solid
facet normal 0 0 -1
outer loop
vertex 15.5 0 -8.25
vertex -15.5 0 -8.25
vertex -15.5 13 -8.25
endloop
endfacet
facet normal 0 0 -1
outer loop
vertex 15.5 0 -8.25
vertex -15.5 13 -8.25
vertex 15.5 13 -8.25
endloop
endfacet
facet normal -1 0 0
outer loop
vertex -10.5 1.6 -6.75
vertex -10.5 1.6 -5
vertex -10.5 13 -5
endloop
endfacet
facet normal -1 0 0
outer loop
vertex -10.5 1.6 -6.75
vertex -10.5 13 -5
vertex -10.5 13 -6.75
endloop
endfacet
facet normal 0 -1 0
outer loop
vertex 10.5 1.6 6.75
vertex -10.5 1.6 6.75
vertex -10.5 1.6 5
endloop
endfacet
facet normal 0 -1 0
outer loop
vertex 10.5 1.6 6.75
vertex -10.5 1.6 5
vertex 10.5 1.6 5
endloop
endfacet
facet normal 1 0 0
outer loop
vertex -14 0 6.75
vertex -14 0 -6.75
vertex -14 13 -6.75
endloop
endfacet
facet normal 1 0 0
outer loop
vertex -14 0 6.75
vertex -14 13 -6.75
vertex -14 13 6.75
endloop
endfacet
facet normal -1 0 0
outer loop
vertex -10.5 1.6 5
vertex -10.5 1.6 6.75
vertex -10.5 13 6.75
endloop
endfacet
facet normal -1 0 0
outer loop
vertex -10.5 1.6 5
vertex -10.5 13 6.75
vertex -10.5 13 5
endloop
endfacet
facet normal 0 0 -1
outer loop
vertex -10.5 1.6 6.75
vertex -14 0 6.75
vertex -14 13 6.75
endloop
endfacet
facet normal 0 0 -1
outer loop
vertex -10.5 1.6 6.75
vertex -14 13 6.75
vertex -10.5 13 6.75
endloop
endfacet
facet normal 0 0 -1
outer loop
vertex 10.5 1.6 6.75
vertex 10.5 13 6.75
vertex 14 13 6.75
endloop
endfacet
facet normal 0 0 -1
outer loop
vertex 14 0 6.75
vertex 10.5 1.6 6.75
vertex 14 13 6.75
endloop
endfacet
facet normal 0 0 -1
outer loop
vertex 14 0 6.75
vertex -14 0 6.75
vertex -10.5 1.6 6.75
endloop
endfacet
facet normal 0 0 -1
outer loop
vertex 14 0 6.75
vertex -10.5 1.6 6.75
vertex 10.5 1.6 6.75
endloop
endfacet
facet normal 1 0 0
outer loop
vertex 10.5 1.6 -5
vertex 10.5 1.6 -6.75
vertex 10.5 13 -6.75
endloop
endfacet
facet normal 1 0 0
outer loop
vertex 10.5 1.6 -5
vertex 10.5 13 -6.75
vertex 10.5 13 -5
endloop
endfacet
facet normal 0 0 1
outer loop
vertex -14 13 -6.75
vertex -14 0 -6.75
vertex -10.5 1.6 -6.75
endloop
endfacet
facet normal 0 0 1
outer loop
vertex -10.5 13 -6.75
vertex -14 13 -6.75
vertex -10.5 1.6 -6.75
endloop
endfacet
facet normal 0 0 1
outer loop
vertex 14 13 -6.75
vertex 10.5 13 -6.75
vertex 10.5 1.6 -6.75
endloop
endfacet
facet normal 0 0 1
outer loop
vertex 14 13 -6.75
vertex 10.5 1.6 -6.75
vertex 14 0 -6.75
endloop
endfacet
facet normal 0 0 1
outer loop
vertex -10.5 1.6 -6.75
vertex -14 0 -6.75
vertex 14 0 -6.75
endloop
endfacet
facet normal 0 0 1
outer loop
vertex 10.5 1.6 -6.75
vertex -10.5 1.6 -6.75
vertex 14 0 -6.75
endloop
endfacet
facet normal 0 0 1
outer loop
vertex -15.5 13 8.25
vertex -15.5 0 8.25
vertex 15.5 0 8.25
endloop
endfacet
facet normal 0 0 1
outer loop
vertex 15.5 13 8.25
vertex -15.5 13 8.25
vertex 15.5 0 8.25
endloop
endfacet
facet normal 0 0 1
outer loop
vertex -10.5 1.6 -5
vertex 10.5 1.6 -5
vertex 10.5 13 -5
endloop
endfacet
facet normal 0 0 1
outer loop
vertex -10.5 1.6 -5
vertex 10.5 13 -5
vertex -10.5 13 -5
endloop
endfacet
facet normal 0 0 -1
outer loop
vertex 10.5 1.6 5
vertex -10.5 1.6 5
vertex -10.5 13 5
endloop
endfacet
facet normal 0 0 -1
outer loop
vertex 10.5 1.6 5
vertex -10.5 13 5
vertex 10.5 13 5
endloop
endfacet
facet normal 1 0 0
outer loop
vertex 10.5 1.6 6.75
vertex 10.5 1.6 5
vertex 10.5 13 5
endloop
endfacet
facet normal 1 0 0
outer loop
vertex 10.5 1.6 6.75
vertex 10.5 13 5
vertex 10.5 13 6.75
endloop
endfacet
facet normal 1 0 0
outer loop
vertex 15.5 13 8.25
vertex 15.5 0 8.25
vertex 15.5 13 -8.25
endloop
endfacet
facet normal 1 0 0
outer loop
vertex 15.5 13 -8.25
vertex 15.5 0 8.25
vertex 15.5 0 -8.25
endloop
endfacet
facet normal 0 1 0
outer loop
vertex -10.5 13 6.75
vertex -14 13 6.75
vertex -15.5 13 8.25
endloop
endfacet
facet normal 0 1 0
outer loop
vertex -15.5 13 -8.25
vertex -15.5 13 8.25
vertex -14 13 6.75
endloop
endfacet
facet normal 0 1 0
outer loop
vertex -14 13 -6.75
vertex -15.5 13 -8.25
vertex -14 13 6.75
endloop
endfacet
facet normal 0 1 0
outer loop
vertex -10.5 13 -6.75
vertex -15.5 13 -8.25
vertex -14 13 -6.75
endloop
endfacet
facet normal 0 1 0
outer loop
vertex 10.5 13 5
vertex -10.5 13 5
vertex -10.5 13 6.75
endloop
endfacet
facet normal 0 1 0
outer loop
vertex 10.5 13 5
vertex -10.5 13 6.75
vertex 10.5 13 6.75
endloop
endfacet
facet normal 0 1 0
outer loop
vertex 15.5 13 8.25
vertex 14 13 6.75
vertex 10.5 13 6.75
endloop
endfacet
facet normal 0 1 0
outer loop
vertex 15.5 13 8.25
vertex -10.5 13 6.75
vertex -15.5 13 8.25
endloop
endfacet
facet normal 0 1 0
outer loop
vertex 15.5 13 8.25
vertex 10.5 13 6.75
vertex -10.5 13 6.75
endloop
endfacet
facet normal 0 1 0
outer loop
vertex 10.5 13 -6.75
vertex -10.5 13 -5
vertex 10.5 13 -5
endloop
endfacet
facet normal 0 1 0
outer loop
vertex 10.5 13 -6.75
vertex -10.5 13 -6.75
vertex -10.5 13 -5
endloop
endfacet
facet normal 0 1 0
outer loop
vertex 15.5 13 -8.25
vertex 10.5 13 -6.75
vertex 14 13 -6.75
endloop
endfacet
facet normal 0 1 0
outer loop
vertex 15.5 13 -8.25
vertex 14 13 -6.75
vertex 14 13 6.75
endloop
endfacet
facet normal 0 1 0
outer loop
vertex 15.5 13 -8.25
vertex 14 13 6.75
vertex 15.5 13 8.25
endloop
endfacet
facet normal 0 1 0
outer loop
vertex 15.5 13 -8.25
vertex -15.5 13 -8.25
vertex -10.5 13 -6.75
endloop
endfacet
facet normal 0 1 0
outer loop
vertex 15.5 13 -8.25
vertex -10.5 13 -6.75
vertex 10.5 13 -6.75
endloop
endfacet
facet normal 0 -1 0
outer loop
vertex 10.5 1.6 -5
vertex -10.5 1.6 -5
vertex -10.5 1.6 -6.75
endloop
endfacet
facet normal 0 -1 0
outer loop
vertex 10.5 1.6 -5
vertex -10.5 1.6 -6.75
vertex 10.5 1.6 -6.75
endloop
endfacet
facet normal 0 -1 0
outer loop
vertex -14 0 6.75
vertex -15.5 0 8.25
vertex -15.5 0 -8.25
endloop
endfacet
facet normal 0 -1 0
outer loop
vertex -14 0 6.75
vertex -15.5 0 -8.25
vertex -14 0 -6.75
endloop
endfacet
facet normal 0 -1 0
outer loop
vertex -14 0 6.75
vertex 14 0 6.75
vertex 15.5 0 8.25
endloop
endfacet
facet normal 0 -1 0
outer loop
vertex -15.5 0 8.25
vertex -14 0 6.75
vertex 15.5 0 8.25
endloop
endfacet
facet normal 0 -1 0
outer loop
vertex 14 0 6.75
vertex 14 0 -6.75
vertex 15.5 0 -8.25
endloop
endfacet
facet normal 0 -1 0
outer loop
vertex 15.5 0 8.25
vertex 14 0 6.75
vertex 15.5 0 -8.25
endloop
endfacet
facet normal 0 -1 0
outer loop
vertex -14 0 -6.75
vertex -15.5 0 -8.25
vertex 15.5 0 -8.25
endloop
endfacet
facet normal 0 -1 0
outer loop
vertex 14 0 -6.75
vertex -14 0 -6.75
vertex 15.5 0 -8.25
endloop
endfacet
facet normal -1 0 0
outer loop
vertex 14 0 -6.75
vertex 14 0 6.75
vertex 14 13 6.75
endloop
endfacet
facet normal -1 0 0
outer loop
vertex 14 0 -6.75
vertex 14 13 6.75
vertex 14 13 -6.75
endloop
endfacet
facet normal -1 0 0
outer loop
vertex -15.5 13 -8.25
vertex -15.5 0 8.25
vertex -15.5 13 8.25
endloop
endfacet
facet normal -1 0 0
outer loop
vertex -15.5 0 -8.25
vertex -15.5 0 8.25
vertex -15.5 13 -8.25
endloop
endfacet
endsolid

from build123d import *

# Parameters (mm, degrees)
SKETCH1_W           = 31
SKETCH1_H           = 16.5
BOSS_EXTRUDE1_DEPTH = 13
SKETCH2_W           = 21
SKETCH2_H           = 1.75
CUT_EXTRUDE1_DEPTH  = 1.6


with BuildPart() as part:
    # Sketch1 → Boss-Extrude1 (new body)
    with BuildSketch(Plane(origin=(0, 0, 0), x_dir=(1, 0, 0), z_dir=(0, 1, 0))):
        Rectangle(SKETCH1_W, SKETCH1_H)
        Polygon((10.5, 5), (-10.5, 5), (-10.5, 6.75), (-14, 6.75), (-14, -6.75), (-10.5, -6.75), (-10.5, -5), (10.5, -5), (10.5, -6.75), (14, -6.75), (14, 6.75), (10.5, 6.75), align=None, mode=Mode.SUBTRACT)
    extrude(amount=BOSS_EXTRUDE1_DEPTH)

    # Sketch2 → Cut-Extrude1 (cut)
    with BuildSketch(Plane.XZ):
        with Locations((0, 5.875)):
            Rectangle(SKETCH2_W, SKETCH2_H)
        with Locations((0, -5.875)):
            Rectangle(SKETCH2_W, SKETCH2_H)
    extrude(amount=-CUT_EXTRUDE1_DEPTH, mode=Mode.SUBTRACT)


solid = part.part
